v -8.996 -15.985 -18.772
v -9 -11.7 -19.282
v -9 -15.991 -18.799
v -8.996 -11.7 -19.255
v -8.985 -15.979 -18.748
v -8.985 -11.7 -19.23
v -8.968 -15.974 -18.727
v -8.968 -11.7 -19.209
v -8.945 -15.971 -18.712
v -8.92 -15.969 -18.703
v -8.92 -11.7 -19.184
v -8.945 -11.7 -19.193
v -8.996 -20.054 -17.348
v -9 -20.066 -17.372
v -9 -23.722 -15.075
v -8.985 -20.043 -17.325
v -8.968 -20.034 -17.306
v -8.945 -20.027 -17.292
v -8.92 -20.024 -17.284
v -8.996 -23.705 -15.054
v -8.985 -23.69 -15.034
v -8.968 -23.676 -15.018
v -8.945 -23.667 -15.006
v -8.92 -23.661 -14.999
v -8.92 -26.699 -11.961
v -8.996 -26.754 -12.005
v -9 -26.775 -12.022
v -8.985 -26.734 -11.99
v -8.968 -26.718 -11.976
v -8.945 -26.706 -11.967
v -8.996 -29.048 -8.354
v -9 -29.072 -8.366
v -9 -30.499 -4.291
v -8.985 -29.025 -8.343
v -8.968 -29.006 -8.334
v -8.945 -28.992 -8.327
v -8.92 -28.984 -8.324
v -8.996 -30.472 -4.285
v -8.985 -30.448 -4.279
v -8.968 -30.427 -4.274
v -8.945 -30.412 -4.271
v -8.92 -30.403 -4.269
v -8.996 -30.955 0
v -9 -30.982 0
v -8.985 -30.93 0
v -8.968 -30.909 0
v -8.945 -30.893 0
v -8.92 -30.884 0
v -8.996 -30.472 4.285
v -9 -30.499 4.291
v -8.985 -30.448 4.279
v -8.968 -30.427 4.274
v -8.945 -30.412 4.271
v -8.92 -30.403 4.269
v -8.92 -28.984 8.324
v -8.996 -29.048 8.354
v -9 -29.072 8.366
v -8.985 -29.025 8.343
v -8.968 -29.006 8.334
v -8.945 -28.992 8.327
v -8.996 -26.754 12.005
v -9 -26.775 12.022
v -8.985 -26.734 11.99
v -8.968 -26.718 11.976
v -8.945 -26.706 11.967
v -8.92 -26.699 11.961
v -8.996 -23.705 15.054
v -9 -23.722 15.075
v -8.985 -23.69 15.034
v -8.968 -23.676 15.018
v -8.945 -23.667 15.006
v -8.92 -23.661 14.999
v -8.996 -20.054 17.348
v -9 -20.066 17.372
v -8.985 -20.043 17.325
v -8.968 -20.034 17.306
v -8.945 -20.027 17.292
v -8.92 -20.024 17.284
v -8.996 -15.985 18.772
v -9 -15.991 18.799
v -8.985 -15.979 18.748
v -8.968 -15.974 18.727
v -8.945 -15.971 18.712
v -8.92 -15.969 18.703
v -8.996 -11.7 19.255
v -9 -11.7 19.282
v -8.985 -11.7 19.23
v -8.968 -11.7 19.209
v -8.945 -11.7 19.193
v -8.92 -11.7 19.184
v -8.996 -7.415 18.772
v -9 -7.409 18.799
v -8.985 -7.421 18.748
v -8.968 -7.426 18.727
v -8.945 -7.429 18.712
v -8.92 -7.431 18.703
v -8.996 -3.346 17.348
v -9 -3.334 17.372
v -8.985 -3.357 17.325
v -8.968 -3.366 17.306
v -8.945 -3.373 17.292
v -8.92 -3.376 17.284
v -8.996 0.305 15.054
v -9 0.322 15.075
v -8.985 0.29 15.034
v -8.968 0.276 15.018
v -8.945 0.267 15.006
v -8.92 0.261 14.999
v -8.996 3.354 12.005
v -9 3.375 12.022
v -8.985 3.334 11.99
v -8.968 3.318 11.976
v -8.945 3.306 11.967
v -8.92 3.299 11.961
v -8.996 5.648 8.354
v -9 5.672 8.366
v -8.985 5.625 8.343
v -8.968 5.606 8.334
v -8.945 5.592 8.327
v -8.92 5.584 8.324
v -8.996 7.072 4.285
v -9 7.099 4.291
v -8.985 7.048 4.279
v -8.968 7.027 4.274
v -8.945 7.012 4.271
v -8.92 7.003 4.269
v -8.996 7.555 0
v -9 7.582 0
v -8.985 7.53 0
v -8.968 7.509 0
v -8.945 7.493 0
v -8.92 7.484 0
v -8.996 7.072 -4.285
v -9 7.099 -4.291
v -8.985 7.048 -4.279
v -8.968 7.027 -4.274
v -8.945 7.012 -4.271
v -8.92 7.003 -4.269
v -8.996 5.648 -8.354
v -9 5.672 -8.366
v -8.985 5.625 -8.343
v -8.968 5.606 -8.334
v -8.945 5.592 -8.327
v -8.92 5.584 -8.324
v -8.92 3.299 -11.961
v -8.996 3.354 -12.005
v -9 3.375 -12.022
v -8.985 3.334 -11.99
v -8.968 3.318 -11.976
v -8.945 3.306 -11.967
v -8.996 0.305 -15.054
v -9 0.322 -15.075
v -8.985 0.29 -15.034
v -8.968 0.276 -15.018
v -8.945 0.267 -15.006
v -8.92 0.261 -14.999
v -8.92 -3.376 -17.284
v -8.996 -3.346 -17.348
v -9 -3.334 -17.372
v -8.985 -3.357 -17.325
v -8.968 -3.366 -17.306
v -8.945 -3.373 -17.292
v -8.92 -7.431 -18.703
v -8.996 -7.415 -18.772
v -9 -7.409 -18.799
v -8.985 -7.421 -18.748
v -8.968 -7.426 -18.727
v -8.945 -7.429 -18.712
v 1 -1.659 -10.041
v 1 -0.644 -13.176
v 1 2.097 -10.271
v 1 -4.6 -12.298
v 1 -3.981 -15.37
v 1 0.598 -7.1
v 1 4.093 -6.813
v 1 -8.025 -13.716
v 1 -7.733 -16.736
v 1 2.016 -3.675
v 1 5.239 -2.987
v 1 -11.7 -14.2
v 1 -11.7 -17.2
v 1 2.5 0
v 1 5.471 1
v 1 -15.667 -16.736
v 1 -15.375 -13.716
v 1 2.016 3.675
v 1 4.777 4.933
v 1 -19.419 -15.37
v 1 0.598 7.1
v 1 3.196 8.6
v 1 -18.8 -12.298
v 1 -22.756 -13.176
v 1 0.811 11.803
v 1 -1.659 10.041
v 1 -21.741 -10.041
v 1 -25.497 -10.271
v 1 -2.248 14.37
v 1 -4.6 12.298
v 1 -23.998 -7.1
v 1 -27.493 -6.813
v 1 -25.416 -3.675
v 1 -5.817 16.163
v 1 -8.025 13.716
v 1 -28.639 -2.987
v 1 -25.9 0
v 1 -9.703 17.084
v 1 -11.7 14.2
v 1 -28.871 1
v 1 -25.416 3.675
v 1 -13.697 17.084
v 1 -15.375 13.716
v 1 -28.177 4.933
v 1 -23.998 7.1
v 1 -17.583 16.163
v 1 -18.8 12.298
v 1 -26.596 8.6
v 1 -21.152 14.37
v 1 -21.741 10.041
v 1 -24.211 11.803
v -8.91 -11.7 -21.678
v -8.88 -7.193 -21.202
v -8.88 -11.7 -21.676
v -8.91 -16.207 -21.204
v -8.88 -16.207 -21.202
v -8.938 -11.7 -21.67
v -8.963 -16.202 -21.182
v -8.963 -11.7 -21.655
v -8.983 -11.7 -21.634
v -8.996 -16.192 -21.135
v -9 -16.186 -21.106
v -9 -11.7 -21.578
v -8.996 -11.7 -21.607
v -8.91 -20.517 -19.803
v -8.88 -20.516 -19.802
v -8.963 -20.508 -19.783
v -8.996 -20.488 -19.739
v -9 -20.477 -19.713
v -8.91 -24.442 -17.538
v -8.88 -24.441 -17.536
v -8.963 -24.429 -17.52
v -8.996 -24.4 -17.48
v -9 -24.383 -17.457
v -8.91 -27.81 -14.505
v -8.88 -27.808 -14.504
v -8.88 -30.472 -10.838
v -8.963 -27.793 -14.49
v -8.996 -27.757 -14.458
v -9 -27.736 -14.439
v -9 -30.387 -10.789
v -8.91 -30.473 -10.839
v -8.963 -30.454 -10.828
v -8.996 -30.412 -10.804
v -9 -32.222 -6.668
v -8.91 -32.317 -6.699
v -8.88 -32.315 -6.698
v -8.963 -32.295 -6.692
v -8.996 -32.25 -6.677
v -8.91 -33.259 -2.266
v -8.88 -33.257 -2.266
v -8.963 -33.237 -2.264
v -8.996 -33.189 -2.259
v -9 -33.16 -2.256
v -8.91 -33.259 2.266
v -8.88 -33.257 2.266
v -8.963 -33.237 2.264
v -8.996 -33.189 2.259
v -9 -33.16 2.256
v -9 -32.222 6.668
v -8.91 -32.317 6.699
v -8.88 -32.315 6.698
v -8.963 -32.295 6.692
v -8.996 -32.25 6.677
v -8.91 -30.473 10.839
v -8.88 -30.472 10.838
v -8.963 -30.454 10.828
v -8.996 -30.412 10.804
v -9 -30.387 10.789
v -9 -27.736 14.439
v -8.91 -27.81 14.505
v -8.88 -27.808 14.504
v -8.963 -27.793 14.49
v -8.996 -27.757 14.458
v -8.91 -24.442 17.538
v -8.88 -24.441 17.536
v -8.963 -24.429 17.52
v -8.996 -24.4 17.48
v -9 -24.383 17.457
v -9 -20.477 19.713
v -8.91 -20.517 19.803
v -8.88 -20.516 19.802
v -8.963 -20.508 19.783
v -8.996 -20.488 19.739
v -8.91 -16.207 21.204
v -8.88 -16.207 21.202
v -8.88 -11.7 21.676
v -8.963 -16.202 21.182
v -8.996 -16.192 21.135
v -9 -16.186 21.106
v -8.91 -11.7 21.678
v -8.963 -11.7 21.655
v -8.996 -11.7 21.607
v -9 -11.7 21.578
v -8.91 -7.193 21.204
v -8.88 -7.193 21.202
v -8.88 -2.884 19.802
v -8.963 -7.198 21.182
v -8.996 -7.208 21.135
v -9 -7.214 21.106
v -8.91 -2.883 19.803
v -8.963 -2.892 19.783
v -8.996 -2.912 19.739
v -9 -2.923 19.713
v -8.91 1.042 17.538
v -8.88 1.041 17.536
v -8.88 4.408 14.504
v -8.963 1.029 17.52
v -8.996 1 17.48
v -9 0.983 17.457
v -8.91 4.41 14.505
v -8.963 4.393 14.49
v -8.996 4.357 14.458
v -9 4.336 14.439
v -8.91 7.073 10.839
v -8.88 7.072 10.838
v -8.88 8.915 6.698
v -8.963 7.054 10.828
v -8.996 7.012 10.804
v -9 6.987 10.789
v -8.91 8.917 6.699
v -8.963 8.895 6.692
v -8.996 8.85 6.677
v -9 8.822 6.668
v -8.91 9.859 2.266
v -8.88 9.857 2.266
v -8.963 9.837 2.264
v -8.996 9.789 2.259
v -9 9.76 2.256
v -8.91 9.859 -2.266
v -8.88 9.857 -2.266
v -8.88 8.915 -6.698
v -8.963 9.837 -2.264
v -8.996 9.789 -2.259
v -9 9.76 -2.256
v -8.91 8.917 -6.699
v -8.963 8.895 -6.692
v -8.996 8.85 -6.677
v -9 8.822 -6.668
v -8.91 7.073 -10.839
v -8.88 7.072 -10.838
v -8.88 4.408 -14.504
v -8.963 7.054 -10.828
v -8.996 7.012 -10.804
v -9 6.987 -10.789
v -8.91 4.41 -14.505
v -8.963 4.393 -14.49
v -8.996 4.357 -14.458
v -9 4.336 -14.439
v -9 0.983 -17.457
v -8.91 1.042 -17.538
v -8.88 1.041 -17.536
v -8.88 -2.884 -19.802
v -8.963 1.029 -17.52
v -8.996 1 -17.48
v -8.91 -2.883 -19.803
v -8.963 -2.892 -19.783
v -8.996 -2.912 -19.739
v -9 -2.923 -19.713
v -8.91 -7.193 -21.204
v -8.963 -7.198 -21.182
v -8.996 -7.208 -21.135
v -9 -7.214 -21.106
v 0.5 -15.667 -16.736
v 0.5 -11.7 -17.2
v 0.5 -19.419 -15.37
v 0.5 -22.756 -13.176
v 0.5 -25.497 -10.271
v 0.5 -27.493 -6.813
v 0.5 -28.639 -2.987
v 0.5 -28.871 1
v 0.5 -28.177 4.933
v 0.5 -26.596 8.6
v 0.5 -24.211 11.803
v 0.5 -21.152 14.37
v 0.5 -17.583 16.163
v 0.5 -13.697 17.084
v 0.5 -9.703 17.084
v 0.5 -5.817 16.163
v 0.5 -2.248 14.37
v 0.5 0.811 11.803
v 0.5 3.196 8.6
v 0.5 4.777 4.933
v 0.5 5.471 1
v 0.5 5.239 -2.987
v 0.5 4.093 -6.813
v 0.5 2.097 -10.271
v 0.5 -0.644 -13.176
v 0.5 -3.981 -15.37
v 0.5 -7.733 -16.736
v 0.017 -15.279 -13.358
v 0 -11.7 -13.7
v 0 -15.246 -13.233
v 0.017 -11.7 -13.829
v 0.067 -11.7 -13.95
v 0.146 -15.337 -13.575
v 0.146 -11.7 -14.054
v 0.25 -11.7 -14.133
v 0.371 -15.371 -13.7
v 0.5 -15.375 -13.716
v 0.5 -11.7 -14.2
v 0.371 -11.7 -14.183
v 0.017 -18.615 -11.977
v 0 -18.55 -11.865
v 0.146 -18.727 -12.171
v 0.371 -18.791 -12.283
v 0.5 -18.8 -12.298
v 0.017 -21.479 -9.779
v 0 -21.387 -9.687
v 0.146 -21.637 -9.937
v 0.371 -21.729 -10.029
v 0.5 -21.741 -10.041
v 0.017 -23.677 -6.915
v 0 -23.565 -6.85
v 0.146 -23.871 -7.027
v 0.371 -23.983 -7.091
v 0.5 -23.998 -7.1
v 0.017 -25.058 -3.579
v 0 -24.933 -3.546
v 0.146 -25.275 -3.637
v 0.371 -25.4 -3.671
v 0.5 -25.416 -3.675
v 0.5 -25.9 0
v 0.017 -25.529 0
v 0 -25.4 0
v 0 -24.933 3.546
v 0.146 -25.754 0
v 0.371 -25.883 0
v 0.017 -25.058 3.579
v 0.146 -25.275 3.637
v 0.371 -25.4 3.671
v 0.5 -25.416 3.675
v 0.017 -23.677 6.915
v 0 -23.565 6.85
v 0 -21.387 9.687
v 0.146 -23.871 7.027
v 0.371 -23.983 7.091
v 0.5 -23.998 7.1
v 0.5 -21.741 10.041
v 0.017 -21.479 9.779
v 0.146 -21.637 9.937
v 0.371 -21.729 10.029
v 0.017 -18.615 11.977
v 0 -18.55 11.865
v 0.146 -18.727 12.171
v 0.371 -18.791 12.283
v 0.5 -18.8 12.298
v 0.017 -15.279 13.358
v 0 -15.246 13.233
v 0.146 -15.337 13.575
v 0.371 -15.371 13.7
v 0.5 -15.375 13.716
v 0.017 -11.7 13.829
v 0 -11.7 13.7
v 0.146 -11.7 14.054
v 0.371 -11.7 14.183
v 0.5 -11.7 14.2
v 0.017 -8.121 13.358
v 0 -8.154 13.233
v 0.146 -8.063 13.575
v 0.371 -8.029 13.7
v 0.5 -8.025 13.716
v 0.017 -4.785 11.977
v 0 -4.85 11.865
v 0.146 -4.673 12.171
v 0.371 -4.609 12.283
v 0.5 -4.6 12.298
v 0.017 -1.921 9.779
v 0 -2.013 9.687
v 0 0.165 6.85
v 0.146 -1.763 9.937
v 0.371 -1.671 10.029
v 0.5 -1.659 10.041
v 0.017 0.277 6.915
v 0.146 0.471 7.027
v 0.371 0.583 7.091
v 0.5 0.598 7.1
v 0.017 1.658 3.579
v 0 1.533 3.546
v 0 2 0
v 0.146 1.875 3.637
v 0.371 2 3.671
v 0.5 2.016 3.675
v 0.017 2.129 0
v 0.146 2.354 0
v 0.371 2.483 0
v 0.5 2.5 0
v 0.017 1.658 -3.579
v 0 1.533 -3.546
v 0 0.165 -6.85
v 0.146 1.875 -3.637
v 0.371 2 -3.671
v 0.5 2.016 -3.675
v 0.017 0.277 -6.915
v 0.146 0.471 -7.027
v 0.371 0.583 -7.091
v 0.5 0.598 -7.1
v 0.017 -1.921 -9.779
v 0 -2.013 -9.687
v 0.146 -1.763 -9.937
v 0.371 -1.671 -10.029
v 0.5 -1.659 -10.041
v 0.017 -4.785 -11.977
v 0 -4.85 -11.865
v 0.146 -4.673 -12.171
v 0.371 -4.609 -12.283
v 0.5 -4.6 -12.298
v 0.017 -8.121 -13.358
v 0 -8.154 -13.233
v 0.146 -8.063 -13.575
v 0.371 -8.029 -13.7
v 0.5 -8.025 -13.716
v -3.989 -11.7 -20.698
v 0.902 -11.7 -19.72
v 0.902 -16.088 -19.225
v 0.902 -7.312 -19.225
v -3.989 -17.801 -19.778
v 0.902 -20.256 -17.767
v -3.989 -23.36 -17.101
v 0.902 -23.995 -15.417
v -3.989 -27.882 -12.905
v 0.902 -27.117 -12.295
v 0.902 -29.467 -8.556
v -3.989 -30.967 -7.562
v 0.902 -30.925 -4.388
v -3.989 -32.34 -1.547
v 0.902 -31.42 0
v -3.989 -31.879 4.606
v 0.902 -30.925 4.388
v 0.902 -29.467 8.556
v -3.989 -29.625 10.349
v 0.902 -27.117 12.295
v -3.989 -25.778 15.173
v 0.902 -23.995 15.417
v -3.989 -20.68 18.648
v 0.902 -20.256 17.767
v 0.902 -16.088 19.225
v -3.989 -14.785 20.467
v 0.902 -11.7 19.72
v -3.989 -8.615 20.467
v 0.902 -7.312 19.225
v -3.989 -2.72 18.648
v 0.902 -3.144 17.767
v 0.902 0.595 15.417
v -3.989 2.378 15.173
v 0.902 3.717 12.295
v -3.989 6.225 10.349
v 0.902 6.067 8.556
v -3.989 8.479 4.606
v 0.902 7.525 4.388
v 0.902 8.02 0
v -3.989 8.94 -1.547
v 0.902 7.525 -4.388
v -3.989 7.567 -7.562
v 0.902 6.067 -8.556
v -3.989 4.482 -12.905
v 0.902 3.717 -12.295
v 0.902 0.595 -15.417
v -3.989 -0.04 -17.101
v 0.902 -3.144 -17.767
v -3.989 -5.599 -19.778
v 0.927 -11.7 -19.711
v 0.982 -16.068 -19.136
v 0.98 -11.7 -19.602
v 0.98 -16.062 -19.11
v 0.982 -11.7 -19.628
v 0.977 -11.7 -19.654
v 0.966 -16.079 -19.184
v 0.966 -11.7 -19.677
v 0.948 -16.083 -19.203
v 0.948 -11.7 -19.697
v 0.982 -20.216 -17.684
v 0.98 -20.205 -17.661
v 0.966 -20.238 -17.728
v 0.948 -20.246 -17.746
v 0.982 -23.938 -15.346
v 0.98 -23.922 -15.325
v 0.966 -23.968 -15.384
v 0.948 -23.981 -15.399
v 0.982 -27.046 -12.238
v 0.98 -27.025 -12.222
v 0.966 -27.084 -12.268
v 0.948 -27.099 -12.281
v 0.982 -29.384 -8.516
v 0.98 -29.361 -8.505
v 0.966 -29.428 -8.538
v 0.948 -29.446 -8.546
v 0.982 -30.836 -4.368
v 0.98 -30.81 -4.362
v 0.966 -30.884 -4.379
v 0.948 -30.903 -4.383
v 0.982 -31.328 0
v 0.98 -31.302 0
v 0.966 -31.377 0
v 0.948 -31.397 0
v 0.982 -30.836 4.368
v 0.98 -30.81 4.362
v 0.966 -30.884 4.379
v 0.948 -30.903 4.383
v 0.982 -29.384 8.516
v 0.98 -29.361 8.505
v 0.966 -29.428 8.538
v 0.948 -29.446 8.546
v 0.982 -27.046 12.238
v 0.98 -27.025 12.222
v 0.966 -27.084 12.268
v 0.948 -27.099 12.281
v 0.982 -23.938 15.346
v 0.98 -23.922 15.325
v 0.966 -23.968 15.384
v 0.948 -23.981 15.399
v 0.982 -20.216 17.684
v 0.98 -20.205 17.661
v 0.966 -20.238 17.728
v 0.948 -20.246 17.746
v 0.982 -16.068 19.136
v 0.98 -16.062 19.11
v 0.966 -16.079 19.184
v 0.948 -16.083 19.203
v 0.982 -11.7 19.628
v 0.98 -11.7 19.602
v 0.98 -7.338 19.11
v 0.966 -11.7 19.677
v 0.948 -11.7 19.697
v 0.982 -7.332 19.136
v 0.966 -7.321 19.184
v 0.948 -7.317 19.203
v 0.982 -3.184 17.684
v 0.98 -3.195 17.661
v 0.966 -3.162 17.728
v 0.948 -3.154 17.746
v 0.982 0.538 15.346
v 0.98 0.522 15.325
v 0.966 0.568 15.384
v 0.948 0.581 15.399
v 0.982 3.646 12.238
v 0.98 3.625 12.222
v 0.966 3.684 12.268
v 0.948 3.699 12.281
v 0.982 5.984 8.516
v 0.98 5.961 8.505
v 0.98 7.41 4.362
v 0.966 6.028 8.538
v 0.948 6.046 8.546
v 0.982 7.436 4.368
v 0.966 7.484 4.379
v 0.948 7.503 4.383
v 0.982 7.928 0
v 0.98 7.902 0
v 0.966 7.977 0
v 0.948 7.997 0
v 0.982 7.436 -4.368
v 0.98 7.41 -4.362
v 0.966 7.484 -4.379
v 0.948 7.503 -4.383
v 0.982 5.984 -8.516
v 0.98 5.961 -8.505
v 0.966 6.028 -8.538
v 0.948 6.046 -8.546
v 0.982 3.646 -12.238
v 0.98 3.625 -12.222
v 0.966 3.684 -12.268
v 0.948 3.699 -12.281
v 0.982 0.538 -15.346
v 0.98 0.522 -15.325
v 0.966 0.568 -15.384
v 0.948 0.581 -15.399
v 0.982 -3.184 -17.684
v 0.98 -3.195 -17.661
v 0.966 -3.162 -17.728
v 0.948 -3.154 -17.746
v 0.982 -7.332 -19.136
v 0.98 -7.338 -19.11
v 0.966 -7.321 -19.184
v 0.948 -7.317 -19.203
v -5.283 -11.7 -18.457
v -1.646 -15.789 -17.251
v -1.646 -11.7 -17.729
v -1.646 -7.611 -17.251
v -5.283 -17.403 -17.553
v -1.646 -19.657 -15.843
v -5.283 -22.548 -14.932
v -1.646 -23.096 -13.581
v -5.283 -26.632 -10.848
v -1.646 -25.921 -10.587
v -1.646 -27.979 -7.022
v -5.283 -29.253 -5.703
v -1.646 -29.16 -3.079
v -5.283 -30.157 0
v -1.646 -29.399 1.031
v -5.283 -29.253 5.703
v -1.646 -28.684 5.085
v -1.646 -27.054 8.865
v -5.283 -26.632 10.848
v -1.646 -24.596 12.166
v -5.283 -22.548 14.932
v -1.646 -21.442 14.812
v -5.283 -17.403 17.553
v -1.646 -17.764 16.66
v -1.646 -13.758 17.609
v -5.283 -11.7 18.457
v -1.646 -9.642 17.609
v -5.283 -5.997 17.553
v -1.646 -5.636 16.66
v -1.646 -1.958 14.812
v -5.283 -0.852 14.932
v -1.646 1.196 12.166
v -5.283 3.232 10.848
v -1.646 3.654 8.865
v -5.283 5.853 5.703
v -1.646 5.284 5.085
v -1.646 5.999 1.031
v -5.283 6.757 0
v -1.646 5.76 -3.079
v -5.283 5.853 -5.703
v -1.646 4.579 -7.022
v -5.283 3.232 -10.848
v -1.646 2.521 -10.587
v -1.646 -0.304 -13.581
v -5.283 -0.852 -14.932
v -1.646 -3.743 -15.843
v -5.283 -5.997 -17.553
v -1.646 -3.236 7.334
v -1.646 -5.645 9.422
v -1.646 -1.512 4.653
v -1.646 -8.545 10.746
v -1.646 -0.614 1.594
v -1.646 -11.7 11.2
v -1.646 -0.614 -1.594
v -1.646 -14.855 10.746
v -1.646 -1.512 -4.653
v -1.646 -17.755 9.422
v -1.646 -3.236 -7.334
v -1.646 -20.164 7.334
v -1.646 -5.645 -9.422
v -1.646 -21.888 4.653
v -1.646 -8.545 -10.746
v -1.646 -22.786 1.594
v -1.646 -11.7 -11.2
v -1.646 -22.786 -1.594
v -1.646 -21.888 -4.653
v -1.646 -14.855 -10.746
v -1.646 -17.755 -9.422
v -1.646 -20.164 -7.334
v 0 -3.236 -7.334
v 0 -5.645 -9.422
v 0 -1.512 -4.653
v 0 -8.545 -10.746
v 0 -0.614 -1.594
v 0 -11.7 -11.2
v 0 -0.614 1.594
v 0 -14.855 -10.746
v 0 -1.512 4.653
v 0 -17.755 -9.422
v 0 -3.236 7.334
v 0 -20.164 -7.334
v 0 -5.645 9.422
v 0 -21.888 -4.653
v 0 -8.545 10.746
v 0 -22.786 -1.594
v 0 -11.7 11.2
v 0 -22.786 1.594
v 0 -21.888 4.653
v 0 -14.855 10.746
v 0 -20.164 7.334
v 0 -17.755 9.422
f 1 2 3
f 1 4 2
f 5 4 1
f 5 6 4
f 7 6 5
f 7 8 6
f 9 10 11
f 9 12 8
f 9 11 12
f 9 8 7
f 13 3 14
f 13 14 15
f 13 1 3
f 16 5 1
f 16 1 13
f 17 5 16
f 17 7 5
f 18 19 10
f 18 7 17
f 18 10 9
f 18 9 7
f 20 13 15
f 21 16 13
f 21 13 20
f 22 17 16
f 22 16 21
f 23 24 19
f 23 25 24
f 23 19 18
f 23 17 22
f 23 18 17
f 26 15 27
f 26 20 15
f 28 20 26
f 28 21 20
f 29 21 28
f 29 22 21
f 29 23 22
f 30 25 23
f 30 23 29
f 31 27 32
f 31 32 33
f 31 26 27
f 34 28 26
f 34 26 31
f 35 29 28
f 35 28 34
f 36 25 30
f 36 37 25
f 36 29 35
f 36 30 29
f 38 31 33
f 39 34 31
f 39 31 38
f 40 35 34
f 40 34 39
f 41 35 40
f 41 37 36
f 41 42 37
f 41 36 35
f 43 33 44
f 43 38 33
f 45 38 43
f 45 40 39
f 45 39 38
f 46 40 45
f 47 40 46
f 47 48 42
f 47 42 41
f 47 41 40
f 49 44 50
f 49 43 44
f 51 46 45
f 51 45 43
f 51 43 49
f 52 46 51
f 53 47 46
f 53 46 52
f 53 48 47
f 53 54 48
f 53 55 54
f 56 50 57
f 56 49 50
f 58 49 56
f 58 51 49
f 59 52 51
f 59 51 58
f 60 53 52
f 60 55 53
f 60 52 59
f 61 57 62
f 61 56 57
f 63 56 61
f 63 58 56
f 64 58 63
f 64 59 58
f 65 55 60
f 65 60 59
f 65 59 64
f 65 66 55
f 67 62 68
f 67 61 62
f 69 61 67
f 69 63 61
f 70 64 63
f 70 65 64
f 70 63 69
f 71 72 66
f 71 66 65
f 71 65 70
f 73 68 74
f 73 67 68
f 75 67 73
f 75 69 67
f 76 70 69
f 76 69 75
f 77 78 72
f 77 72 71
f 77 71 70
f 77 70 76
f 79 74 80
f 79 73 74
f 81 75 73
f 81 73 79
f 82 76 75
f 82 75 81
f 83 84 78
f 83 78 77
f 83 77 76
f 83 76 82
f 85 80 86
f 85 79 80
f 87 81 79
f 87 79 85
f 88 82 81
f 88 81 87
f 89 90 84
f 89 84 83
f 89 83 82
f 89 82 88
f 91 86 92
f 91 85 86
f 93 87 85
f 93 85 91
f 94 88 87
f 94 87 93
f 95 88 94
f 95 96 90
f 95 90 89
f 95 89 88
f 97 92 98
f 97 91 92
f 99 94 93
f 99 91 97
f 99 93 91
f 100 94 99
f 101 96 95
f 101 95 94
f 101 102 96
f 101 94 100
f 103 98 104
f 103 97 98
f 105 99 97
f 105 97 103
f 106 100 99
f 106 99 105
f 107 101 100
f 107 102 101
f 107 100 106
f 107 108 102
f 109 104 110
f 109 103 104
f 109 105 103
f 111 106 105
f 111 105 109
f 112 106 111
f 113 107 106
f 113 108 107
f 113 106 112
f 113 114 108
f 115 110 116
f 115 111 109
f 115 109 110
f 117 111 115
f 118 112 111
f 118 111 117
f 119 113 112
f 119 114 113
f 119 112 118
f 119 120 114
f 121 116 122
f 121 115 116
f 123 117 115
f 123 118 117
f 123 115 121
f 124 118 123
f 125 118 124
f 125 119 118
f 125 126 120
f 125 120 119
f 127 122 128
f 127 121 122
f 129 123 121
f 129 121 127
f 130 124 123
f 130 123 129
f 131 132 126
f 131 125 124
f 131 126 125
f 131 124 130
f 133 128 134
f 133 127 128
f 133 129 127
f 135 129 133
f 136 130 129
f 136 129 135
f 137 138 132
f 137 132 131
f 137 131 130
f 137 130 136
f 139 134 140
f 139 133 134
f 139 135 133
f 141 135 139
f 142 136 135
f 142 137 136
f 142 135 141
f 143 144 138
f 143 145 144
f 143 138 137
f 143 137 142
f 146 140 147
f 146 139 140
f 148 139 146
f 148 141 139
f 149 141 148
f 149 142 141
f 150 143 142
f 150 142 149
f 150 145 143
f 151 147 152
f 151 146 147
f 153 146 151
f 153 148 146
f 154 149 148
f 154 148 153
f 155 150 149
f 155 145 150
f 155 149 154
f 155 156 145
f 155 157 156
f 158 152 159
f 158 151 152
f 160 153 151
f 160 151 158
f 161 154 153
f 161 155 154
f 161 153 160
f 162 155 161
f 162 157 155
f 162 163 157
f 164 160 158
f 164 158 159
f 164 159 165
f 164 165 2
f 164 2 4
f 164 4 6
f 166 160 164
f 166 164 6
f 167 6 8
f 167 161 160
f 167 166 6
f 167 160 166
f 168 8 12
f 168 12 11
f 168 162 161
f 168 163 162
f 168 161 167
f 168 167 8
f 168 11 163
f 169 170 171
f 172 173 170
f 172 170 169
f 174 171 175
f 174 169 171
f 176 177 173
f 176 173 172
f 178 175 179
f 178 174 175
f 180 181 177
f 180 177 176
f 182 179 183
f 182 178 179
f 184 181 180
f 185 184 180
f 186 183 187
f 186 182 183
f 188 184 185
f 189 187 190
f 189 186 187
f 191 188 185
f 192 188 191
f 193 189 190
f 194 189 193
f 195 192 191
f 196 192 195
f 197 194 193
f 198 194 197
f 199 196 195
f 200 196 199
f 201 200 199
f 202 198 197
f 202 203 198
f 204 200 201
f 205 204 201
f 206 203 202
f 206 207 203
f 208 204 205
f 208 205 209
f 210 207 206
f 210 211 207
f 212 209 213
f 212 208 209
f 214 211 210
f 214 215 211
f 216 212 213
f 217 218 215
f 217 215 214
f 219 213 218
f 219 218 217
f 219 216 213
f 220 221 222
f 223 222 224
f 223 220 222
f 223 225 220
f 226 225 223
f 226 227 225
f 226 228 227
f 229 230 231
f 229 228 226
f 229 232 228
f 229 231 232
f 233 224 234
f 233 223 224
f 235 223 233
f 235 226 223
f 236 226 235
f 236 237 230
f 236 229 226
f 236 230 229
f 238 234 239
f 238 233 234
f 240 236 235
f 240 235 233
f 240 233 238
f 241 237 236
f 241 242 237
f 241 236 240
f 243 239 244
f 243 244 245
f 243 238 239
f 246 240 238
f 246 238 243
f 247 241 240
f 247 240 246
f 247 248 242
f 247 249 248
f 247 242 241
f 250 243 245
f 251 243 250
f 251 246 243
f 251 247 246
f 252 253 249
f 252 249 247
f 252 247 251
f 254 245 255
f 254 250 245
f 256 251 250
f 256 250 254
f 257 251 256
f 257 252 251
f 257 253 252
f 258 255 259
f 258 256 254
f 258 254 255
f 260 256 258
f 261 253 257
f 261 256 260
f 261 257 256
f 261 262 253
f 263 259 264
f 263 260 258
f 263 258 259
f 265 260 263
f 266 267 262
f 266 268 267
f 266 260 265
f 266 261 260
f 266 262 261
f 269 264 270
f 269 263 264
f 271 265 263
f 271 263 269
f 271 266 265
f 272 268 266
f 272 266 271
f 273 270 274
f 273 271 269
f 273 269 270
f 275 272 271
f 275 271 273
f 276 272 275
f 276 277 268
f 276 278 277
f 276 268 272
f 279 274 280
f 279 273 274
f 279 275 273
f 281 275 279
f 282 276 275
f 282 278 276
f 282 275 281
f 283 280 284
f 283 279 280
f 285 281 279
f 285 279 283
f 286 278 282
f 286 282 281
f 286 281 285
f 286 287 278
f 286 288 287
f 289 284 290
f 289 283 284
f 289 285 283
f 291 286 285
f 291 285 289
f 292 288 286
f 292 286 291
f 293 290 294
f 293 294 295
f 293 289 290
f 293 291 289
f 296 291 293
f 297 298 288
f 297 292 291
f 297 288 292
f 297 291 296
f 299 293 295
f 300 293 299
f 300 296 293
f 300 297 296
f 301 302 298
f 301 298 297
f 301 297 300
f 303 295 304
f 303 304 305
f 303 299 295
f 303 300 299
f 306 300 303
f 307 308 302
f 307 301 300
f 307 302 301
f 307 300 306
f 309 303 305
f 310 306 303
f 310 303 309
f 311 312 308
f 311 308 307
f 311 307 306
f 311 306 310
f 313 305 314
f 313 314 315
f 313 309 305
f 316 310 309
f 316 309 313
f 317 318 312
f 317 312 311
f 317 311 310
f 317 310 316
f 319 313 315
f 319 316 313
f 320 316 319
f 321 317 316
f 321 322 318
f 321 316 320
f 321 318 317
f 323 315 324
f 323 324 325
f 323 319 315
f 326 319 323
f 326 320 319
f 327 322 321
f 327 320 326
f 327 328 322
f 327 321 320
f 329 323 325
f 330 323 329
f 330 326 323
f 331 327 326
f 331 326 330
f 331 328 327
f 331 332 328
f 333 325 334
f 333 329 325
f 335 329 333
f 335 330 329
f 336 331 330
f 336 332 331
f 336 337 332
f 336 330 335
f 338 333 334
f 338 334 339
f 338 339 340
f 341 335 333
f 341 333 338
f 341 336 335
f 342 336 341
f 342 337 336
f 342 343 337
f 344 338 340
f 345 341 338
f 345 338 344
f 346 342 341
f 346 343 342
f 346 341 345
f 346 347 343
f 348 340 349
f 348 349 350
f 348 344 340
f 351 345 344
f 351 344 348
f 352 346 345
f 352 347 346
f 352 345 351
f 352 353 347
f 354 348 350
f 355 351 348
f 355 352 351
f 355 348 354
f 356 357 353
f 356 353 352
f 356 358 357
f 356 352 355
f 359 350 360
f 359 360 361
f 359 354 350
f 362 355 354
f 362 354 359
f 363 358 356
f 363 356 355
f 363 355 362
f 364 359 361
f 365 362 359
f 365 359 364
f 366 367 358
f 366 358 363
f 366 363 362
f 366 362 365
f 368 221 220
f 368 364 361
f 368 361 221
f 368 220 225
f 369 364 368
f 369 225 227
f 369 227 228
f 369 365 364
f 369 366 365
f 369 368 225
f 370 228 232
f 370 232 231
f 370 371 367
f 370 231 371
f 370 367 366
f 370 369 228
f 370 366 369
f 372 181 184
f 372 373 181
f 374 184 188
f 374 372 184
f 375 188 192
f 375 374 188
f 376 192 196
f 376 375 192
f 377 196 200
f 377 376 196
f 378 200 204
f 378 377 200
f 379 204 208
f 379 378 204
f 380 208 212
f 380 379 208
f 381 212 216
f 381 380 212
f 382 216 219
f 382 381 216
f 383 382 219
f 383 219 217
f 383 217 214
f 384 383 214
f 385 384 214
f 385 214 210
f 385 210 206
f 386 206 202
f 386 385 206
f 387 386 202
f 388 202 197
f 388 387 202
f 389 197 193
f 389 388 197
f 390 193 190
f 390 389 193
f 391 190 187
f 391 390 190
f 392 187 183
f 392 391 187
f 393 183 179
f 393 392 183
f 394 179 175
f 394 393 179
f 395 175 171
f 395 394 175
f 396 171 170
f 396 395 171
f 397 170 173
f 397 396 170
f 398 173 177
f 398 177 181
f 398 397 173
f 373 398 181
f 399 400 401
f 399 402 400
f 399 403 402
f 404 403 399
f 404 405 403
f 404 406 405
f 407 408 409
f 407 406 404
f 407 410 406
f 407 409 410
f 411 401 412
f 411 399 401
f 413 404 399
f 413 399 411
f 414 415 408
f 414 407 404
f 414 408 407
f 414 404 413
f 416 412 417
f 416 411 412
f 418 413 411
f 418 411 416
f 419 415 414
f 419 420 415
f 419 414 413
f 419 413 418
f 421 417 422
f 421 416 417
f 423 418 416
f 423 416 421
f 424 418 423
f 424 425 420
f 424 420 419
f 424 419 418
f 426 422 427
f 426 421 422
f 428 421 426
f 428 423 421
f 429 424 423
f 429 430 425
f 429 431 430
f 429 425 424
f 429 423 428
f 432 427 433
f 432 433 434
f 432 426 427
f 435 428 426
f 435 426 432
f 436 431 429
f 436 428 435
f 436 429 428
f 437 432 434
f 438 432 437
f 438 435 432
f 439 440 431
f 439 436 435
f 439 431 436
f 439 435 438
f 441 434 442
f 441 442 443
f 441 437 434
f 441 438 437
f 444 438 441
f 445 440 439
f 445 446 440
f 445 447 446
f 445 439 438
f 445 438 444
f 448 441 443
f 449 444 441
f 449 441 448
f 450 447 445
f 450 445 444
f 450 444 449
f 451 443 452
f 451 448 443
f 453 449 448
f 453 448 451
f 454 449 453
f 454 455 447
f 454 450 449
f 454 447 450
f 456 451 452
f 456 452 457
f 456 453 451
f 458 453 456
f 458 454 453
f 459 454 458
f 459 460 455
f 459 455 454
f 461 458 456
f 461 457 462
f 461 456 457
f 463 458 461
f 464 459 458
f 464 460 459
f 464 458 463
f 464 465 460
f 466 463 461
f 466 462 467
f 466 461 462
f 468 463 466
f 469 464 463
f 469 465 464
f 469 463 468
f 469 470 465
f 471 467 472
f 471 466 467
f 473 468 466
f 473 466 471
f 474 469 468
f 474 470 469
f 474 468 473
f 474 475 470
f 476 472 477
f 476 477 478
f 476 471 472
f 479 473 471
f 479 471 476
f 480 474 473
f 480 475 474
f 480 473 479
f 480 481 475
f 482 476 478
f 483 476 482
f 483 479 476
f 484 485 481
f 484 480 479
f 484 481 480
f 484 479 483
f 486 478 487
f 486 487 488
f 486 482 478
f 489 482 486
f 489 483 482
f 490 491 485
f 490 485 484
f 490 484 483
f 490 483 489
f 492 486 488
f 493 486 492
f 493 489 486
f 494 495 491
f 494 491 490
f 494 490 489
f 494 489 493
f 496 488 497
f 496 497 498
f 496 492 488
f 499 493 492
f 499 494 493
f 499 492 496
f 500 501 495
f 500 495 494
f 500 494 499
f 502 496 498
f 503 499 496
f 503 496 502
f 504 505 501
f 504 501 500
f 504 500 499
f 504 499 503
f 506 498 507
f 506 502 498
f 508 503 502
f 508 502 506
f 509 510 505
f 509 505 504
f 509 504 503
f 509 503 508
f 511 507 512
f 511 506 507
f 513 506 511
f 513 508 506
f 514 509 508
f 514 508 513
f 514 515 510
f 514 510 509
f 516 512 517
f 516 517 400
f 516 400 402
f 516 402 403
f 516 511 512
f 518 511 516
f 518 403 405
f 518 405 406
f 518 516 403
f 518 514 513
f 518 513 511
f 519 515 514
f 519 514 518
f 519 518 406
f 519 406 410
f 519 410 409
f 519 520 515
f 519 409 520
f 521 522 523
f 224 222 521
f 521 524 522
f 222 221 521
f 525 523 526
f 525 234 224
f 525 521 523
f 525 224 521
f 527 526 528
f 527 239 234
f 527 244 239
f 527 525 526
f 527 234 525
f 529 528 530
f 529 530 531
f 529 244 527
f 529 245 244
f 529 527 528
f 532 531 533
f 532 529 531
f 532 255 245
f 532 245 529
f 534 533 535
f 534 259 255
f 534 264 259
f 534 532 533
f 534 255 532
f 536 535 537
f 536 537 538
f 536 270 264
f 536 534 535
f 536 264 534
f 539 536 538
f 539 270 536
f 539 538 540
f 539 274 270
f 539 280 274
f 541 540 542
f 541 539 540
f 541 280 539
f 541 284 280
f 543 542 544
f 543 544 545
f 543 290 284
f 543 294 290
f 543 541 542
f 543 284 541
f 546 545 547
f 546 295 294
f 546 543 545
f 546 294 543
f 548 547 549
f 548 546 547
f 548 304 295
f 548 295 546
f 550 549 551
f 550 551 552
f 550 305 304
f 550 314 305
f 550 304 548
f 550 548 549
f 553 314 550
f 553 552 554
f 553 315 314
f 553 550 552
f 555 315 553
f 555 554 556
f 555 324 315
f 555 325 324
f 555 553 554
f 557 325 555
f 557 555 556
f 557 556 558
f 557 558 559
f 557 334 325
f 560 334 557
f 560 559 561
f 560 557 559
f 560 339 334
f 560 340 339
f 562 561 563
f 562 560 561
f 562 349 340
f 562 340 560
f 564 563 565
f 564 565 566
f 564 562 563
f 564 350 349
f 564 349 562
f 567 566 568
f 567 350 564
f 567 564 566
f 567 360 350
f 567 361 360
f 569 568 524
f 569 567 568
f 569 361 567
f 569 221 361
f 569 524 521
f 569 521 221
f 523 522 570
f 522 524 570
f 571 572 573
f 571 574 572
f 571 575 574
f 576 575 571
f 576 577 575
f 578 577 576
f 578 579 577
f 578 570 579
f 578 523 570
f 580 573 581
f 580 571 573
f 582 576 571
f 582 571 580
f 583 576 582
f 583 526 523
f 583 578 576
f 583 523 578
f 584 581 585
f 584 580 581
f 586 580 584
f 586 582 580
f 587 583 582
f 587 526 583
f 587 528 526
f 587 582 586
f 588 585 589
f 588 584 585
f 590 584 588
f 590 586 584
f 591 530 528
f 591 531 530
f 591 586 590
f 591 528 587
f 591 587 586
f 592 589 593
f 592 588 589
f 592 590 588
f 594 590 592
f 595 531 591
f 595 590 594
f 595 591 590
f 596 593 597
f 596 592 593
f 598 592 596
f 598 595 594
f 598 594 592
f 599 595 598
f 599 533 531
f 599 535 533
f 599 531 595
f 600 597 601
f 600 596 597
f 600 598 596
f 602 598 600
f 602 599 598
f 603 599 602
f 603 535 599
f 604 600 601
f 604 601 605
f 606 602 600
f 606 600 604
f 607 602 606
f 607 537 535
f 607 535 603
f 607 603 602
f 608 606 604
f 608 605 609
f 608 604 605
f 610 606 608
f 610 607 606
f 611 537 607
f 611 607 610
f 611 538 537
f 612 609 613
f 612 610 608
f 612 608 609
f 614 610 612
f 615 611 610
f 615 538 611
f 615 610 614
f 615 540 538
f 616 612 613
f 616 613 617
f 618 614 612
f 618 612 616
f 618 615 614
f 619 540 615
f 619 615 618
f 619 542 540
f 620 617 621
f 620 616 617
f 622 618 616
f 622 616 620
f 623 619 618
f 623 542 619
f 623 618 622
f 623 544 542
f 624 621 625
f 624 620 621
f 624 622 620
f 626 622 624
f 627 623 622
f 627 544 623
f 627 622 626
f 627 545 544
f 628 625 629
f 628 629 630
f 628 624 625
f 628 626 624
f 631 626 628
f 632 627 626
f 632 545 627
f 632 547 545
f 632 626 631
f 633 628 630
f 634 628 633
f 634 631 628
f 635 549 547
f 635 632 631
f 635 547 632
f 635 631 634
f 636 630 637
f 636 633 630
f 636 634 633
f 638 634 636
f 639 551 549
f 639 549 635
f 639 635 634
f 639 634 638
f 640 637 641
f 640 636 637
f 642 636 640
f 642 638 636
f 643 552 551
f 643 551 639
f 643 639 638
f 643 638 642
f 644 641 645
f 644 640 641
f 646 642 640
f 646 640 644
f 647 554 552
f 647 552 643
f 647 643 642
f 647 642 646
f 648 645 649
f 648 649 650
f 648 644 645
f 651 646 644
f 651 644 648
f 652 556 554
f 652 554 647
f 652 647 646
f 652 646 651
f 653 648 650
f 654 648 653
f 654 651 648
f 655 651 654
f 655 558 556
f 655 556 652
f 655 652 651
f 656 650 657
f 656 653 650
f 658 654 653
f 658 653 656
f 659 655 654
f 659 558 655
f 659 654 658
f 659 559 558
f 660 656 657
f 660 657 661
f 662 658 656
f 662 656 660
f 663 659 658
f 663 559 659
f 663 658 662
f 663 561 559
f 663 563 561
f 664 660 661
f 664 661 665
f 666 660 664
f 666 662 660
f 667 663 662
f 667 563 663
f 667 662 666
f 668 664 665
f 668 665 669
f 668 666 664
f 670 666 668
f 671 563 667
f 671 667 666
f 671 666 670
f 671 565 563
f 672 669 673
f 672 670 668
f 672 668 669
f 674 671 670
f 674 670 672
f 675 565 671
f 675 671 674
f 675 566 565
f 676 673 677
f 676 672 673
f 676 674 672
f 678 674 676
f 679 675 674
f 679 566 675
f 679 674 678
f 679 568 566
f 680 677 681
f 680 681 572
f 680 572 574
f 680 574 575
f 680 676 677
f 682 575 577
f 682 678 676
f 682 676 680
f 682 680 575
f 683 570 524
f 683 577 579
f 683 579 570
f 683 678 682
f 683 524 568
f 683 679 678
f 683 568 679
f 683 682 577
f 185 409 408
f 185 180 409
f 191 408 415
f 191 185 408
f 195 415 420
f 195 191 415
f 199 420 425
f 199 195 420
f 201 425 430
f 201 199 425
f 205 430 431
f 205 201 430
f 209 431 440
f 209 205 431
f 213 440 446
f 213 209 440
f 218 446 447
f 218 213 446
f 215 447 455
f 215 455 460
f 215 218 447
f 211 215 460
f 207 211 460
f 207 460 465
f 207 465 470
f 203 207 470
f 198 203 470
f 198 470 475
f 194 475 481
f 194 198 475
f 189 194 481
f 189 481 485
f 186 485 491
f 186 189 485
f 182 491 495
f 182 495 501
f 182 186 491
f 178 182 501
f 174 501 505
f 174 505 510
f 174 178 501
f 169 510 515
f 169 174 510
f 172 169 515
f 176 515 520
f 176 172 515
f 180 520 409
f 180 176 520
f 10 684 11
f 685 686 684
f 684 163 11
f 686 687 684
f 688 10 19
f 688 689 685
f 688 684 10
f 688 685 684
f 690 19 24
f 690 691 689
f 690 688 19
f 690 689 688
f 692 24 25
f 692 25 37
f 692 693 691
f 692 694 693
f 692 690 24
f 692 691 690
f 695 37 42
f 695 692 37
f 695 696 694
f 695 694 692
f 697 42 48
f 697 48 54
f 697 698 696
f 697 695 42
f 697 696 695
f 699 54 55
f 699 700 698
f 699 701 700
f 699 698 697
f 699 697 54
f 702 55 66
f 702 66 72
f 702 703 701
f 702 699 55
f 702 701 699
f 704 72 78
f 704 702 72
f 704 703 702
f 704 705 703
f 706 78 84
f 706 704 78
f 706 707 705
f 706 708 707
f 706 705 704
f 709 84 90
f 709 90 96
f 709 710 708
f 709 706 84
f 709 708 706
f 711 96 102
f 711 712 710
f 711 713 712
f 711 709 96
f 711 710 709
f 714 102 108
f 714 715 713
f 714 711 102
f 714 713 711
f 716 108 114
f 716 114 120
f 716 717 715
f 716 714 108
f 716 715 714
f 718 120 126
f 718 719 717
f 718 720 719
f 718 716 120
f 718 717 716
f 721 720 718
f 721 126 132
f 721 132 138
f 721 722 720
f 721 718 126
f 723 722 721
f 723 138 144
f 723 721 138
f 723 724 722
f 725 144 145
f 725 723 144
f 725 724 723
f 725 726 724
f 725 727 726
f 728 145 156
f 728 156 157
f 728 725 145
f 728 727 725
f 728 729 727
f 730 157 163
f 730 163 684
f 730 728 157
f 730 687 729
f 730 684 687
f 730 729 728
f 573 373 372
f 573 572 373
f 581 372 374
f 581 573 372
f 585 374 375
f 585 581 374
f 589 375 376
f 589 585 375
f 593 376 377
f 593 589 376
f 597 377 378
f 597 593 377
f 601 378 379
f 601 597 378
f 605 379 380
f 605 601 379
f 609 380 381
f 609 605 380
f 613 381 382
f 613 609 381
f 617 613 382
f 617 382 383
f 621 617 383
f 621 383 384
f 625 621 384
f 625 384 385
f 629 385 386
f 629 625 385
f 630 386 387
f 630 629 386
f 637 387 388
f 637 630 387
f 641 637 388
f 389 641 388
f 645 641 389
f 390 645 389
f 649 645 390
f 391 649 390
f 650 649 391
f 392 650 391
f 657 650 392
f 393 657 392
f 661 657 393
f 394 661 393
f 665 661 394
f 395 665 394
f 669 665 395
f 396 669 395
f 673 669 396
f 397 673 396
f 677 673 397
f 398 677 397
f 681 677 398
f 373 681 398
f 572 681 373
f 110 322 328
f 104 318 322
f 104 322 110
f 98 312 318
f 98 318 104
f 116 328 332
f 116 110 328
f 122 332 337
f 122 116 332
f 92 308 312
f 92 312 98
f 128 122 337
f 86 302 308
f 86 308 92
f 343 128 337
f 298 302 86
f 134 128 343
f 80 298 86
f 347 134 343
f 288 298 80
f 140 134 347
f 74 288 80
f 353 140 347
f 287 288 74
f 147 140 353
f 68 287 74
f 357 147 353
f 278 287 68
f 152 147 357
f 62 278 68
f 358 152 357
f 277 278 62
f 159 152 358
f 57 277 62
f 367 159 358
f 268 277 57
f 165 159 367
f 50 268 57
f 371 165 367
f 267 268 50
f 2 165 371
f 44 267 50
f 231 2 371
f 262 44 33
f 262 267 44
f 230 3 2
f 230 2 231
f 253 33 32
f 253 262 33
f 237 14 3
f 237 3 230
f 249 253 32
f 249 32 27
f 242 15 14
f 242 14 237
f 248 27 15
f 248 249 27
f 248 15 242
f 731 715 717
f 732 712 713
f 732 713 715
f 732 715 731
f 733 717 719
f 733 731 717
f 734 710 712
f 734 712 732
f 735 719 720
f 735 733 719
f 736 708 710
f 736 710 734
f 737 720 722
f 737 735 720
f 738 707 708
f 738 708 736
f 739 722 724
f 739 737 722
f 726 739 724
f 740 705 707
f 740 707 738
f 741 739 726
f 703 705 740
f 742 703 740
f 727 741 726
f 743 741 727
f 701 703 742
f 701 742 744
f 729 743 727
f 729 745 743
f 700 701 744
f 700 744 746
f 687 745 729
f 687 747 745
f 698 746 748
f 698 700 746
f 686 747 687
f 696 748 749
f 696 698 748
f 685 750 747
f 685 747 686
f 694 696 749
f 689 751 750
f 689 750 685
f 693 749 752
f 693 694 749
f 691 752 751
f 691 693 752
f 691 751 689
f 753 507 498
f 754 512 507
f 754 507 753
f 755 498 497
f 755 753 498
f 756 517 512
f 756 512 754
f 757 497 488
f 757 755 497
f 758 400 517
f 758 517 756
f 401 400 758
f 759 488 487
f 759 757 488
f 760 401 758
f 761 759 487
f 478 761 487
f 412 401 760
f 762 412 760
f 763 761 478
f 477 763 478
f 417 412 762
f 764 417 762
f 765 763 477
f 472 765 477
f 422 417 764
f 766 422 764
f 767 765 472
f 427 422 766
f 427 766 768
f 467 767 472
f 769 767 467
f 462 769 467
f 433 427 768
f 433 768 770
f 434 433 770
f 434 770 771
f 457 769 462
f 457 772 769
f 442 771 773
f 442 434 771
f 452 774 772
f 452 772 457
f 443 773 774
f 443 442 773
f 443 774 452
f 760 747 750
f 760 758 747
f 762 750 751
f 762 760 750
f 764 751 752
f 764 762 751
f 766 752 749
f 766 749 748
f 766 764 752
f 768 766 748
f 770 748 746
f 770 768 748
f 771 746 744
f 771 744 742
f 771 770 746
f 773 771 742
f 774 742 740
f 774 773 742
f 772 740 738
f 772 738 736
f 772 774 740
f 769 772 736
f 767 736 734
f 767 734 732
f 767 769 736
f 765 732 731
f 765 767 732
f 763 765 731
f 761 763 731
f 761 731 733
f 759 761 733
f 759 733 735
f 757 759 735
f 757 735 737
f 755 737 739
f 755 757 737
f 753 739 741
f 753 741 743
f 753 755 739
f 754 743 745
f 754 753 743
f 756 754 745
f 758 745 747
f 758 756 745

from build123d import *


with BuildPart() as part:
    # Szkic1 → Obrót1 (revolve)
    with BuildSketch(Plane.XY, mode=Mode.PRIVATE) as obr_t1_sk:
        with BuildLine():
            Line((0.901941932, 8.019611614), (-8.880388386, 9.976077677))
            ThreePointArc((-8.880388386, 9.976077677), (-8.963398891, 9.955353824), (-9, 9.87801961))
            Line((-9, 9.87801961), (-9, 7.58198039))
            ThreePointArc((-9, 7.58198039), (-8.977334214, 7.5185815), (-8.919611614, 7.483922323))
            Line((-8.919611614, 7.483922323), (-1.645644932, 6.029128986))
            Line((-1.645644932, 6.029128986), (-1.645644932, -0.5))
            Line((-1.645644932, -0.5), (0, -0.5))
            Line((0, -0.5), (0, 2))
            ThreePointArc((0, 2), (0.146446609, 2.353553391), (0.5, 2.5))
            Line((0.5, 2.5), (1, 2.5))
            Line((1, 2.5), (1, 5.5))
            Line((1, 5.5), (0.5, 5.5))
            Line((0.5, 5.5), (0.980388386, 7.901941932))
            ThreePointArc((0.980388386, 7.901941932), (0.965535348, 7.977023566), (0.901941932, 8.019611614))
        make_face()
    revolve(obr_t1_sk.sketch.rotate(Axis((0, -11.7, 0), (-1, 0, 0)), 90), axis=Axis((0, -11.7, 0), (-1, 0, 0)))


solid = part.part
